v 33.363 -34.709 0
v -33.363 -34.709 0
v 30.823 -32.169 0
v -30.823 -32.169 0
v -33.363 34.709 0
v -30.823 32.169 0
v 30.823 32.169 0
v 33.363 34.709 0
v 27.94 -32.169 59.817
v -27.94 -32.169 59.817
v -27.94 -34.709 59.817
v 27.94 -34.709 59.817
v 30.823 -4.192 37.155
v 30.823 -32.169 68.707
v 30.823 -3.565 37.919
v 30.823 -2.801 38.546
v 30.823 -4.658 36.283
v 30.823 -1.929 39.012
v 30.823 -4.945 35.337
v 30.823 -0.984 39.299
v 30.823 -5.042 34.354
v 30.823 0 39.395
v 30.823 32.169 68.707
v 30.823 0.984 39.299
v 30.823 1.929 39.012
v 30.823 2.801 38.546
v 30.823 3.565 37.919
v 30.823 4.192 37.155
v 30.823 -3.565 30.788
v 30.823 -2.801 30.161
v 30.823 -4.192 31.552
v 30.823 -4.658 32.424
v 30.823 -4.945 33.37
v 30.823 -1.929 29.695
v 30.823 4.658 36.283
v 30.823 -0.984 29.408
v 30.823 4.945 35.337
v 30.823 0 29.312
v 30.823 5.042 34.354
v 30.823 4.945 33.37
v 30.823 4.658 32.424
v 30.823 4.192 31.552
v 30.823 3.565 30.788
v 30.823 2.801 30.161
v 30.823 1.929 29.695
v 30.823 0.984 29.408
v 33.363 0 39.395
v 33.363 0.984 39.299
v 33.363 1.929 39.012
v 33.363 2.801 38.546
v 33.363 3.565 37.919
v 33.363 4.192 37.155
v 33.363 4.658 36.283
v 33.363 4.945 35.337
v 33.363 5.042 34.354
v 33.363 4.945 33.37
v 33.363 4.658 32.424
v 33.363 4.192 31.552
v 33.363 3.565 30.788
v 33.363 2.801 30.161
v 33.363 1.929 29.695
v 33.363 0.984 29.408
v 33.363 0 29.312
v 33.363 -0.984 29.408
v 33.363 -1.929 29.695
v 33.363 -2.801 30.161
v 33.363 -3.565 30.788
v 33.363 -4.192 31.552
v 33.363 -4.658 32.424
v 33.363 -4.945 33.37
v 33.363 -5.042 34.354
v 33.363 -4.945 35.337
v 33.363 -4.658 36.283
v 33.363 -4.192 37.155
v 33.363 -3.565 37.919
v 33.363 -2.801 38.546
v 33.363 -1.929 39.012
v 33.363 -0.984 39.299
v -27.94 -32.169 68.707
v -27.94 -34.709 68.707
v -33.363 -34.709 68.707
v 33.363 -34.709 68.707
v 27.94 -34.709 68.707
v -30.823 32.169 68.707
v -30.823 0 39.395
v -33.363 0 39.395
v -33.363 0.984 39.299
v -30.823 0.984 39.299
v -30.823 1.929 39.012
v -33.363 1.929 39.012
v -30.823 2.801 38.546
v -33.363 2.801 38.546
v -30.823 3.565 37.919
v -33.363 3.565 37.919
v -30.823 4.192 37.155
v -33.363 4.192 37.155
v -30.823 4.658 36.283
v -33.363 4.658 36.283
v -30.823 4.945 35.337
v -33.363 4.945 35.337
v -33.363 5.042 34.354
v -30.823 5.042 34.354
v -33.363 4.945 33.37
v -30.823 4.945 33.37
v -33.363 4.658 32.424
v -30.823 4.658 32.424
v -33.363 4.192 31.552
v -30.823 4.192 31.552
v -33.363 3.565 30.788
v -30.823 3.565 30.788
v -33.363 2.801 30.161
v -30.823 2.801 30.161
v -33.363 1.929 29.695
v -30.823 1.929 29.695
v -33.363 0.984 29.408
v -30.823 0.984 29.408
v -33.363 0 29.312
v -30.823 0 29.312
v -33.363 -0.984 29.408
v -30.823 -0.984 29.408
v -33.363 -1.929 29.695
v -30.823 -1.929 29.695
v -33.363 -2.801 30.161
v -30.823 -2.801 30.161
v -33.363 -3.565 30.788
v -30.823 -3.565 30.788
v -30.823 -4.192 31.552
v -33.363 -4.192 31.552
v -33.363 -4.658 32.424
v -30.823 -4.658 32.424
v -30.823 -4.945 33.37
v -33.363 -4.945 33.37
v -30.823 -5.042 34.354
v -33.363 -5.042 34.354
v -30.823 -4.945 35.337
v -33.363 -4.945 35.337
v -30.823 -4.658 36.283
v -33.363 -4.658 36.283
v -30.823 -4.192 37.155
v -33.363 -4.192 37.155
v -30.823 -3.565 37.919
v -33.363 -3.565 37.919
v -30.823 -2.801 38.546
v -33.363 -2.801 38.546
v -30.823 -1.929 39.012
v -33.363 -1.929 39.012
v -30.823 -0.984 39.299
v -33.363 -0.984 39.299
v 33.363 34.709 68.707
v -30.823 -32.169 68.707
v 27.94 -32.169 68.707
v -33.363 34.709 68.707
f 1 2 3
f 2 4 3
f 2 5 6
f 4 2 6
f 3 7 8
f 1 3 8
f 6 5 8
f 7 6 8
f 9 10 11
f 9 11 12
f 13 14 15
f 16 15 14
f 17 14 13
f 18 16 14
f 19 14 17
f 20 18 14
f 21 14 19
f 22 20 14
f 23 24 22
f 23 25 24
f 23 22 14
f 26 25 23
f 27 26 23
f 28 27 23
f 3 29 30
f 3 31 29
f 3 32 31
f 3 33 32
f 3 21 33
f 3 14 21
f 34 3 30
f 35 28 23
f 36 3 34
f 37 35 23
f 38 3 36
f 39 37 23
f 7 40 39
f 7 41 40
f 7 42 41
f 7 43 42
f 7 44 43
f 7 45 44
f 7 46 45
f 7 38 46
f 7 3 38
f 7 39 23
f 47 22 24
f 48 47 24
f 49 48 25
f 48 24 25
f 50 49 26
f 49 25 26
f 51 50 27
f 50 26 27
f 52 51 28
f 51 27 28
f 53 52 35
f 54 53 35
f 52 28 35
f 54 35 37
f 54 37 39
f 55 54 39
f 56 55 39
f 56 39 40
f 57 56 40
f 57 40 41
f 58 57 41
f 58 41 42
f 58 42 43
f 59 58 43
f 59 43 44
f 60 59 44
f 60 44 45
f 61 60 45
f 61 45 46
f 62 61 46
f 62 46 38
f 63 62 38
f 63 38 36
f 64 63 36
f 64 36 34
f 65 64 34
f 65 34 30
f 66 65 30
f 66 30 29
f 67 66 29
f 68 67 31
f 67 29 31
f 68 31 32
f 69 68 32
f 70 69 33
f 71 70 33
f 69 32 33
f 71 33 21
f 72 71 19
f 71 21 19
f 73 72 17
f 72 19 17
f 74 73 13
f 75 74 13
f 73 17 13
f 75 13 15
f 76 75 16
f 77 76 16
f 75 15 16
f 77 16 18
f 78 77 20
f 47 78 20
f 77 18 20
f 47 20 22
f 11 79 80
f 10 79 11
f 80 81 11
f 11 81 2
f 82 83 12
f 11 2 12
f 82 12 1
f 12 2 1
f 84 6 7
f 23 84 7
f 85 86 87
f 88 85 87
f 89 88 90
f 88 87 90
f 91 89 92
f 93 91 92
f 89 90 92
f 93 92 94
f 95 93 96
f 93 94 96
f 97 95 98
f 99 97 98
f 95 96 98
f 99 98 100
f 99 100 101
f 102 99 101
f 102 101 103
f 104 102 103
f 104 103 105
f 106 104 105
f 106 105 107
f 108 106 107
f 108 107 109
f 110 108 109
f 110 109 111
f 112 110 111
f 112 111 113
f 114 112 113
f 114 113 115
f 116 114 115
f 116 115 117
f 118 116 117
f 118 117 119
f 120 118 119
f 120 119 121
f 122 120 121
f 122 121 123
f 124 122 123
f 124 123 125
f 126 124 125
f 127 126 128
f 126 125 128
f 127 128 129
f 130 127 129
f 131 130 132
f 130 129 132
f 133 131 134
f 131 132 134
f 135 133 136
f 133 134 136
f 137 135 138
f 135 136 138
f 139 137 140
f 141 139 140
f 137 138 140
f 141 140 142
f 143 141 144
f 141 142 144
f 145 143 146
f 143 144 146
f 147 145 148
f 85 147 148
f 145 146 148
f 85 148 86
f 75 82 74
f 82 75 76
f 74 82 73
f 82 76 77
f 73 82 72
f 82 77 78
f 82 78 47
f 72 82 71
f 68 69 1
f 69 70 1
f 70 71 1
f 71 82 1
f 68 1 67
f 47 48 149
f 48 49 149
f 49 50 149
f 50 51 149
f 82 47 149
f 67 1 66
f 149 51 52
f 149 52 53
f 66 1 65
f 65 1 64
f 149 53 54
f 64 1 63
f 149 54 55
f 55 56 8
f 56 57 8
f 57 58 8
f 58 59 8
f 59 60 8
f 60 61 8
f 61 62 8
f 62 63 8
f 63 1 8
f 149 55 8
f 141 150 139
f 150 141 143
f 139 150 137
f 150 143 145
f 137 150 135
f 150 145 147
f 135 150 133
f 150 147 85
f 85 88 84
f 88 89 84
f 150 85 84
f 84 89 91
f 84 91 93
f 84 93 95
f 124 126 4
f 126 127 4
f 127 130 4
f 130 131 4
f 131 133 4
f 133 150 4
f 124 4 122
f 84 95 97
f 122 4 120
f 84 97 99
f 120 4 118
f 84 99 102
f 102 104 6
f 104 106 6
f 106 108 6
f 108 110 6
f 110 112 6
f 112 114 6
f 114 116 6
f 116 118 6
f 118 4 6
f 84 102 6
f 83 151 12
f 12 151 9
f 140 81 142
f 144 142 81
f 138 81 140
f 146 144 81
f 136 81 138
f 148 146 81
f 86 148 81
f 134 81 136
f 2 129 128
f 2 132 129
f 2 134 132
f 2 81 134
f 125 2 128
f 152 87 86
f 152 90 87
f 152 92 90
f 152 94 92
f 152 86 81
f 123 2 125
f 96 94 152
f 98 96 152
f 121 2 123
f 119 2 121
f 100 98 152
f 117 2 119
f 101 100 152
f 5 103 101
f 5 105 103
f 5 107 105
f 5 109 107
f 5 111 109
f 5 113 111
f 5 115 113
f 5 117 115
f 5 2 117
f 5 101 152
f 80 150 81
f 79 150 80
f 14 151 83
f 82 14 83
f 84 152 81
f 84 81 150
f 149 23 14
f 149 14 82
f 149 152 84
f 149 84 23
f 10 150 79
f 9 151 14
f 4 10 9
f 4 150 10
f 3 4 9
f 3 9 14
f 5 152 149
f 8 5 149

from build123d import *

# Parameters (mm, degrees)
SKETCH1_W               = 66.7258
SKETCH1_H               = 69.4182
SKETCH1_W_2             = 61.6458
SKETCH1_H_2             = 64.3382
EXTRUDE_THIN1_DEPTH     = 68.707
F_3_8_CLEARANCE_HOLE1_D = 10.0838
SKETCH4_W               = 55.88
SKETCH4_H               = 8.89
CUT_EXTRUDE1_DEPTH      = 3.54


with BuildPart() as part:
    # Sketch1 → Extrude-Thin1 (new body)
    with BuildSketch(Plane.XY):
        Rectangle(SKETCH1_W, SKETCH1_H)
        Rectangle(SKETCH1_W_2, SKETCH1_H_2, mode=Mode.SUBTRACT)
    extrude(amount=EXTRUDE_THIN1_DEPTH)

    # 3/8 Clearance Hole1 (through all)
    with Locations(Plane(origin=(33.3629, 0, 0), x_dir=(0, 0, -1), z_dir=(1, 0, 0))):
        with Locations((-34.3535, 0)):
            Hole(F_3_8_CLEARANCE_HOLE1_D / 2)

    # Sketch4 → Cut-Extrude1 (cut, through all)
    with BuildSketch(Plane(origin=(0, -32.1691, 0), x_dir=(1, 0, 0), z_dir=(0, 1, 0))):
        with Locations((0, -64.262)):
            Rectangle(SKETCH4_W, SKETCH4_H)
    extrude(amount=-CUT_EXTRUDE1_DEPTH, mode=Mode.SUBTRACT)


solid = part.part
